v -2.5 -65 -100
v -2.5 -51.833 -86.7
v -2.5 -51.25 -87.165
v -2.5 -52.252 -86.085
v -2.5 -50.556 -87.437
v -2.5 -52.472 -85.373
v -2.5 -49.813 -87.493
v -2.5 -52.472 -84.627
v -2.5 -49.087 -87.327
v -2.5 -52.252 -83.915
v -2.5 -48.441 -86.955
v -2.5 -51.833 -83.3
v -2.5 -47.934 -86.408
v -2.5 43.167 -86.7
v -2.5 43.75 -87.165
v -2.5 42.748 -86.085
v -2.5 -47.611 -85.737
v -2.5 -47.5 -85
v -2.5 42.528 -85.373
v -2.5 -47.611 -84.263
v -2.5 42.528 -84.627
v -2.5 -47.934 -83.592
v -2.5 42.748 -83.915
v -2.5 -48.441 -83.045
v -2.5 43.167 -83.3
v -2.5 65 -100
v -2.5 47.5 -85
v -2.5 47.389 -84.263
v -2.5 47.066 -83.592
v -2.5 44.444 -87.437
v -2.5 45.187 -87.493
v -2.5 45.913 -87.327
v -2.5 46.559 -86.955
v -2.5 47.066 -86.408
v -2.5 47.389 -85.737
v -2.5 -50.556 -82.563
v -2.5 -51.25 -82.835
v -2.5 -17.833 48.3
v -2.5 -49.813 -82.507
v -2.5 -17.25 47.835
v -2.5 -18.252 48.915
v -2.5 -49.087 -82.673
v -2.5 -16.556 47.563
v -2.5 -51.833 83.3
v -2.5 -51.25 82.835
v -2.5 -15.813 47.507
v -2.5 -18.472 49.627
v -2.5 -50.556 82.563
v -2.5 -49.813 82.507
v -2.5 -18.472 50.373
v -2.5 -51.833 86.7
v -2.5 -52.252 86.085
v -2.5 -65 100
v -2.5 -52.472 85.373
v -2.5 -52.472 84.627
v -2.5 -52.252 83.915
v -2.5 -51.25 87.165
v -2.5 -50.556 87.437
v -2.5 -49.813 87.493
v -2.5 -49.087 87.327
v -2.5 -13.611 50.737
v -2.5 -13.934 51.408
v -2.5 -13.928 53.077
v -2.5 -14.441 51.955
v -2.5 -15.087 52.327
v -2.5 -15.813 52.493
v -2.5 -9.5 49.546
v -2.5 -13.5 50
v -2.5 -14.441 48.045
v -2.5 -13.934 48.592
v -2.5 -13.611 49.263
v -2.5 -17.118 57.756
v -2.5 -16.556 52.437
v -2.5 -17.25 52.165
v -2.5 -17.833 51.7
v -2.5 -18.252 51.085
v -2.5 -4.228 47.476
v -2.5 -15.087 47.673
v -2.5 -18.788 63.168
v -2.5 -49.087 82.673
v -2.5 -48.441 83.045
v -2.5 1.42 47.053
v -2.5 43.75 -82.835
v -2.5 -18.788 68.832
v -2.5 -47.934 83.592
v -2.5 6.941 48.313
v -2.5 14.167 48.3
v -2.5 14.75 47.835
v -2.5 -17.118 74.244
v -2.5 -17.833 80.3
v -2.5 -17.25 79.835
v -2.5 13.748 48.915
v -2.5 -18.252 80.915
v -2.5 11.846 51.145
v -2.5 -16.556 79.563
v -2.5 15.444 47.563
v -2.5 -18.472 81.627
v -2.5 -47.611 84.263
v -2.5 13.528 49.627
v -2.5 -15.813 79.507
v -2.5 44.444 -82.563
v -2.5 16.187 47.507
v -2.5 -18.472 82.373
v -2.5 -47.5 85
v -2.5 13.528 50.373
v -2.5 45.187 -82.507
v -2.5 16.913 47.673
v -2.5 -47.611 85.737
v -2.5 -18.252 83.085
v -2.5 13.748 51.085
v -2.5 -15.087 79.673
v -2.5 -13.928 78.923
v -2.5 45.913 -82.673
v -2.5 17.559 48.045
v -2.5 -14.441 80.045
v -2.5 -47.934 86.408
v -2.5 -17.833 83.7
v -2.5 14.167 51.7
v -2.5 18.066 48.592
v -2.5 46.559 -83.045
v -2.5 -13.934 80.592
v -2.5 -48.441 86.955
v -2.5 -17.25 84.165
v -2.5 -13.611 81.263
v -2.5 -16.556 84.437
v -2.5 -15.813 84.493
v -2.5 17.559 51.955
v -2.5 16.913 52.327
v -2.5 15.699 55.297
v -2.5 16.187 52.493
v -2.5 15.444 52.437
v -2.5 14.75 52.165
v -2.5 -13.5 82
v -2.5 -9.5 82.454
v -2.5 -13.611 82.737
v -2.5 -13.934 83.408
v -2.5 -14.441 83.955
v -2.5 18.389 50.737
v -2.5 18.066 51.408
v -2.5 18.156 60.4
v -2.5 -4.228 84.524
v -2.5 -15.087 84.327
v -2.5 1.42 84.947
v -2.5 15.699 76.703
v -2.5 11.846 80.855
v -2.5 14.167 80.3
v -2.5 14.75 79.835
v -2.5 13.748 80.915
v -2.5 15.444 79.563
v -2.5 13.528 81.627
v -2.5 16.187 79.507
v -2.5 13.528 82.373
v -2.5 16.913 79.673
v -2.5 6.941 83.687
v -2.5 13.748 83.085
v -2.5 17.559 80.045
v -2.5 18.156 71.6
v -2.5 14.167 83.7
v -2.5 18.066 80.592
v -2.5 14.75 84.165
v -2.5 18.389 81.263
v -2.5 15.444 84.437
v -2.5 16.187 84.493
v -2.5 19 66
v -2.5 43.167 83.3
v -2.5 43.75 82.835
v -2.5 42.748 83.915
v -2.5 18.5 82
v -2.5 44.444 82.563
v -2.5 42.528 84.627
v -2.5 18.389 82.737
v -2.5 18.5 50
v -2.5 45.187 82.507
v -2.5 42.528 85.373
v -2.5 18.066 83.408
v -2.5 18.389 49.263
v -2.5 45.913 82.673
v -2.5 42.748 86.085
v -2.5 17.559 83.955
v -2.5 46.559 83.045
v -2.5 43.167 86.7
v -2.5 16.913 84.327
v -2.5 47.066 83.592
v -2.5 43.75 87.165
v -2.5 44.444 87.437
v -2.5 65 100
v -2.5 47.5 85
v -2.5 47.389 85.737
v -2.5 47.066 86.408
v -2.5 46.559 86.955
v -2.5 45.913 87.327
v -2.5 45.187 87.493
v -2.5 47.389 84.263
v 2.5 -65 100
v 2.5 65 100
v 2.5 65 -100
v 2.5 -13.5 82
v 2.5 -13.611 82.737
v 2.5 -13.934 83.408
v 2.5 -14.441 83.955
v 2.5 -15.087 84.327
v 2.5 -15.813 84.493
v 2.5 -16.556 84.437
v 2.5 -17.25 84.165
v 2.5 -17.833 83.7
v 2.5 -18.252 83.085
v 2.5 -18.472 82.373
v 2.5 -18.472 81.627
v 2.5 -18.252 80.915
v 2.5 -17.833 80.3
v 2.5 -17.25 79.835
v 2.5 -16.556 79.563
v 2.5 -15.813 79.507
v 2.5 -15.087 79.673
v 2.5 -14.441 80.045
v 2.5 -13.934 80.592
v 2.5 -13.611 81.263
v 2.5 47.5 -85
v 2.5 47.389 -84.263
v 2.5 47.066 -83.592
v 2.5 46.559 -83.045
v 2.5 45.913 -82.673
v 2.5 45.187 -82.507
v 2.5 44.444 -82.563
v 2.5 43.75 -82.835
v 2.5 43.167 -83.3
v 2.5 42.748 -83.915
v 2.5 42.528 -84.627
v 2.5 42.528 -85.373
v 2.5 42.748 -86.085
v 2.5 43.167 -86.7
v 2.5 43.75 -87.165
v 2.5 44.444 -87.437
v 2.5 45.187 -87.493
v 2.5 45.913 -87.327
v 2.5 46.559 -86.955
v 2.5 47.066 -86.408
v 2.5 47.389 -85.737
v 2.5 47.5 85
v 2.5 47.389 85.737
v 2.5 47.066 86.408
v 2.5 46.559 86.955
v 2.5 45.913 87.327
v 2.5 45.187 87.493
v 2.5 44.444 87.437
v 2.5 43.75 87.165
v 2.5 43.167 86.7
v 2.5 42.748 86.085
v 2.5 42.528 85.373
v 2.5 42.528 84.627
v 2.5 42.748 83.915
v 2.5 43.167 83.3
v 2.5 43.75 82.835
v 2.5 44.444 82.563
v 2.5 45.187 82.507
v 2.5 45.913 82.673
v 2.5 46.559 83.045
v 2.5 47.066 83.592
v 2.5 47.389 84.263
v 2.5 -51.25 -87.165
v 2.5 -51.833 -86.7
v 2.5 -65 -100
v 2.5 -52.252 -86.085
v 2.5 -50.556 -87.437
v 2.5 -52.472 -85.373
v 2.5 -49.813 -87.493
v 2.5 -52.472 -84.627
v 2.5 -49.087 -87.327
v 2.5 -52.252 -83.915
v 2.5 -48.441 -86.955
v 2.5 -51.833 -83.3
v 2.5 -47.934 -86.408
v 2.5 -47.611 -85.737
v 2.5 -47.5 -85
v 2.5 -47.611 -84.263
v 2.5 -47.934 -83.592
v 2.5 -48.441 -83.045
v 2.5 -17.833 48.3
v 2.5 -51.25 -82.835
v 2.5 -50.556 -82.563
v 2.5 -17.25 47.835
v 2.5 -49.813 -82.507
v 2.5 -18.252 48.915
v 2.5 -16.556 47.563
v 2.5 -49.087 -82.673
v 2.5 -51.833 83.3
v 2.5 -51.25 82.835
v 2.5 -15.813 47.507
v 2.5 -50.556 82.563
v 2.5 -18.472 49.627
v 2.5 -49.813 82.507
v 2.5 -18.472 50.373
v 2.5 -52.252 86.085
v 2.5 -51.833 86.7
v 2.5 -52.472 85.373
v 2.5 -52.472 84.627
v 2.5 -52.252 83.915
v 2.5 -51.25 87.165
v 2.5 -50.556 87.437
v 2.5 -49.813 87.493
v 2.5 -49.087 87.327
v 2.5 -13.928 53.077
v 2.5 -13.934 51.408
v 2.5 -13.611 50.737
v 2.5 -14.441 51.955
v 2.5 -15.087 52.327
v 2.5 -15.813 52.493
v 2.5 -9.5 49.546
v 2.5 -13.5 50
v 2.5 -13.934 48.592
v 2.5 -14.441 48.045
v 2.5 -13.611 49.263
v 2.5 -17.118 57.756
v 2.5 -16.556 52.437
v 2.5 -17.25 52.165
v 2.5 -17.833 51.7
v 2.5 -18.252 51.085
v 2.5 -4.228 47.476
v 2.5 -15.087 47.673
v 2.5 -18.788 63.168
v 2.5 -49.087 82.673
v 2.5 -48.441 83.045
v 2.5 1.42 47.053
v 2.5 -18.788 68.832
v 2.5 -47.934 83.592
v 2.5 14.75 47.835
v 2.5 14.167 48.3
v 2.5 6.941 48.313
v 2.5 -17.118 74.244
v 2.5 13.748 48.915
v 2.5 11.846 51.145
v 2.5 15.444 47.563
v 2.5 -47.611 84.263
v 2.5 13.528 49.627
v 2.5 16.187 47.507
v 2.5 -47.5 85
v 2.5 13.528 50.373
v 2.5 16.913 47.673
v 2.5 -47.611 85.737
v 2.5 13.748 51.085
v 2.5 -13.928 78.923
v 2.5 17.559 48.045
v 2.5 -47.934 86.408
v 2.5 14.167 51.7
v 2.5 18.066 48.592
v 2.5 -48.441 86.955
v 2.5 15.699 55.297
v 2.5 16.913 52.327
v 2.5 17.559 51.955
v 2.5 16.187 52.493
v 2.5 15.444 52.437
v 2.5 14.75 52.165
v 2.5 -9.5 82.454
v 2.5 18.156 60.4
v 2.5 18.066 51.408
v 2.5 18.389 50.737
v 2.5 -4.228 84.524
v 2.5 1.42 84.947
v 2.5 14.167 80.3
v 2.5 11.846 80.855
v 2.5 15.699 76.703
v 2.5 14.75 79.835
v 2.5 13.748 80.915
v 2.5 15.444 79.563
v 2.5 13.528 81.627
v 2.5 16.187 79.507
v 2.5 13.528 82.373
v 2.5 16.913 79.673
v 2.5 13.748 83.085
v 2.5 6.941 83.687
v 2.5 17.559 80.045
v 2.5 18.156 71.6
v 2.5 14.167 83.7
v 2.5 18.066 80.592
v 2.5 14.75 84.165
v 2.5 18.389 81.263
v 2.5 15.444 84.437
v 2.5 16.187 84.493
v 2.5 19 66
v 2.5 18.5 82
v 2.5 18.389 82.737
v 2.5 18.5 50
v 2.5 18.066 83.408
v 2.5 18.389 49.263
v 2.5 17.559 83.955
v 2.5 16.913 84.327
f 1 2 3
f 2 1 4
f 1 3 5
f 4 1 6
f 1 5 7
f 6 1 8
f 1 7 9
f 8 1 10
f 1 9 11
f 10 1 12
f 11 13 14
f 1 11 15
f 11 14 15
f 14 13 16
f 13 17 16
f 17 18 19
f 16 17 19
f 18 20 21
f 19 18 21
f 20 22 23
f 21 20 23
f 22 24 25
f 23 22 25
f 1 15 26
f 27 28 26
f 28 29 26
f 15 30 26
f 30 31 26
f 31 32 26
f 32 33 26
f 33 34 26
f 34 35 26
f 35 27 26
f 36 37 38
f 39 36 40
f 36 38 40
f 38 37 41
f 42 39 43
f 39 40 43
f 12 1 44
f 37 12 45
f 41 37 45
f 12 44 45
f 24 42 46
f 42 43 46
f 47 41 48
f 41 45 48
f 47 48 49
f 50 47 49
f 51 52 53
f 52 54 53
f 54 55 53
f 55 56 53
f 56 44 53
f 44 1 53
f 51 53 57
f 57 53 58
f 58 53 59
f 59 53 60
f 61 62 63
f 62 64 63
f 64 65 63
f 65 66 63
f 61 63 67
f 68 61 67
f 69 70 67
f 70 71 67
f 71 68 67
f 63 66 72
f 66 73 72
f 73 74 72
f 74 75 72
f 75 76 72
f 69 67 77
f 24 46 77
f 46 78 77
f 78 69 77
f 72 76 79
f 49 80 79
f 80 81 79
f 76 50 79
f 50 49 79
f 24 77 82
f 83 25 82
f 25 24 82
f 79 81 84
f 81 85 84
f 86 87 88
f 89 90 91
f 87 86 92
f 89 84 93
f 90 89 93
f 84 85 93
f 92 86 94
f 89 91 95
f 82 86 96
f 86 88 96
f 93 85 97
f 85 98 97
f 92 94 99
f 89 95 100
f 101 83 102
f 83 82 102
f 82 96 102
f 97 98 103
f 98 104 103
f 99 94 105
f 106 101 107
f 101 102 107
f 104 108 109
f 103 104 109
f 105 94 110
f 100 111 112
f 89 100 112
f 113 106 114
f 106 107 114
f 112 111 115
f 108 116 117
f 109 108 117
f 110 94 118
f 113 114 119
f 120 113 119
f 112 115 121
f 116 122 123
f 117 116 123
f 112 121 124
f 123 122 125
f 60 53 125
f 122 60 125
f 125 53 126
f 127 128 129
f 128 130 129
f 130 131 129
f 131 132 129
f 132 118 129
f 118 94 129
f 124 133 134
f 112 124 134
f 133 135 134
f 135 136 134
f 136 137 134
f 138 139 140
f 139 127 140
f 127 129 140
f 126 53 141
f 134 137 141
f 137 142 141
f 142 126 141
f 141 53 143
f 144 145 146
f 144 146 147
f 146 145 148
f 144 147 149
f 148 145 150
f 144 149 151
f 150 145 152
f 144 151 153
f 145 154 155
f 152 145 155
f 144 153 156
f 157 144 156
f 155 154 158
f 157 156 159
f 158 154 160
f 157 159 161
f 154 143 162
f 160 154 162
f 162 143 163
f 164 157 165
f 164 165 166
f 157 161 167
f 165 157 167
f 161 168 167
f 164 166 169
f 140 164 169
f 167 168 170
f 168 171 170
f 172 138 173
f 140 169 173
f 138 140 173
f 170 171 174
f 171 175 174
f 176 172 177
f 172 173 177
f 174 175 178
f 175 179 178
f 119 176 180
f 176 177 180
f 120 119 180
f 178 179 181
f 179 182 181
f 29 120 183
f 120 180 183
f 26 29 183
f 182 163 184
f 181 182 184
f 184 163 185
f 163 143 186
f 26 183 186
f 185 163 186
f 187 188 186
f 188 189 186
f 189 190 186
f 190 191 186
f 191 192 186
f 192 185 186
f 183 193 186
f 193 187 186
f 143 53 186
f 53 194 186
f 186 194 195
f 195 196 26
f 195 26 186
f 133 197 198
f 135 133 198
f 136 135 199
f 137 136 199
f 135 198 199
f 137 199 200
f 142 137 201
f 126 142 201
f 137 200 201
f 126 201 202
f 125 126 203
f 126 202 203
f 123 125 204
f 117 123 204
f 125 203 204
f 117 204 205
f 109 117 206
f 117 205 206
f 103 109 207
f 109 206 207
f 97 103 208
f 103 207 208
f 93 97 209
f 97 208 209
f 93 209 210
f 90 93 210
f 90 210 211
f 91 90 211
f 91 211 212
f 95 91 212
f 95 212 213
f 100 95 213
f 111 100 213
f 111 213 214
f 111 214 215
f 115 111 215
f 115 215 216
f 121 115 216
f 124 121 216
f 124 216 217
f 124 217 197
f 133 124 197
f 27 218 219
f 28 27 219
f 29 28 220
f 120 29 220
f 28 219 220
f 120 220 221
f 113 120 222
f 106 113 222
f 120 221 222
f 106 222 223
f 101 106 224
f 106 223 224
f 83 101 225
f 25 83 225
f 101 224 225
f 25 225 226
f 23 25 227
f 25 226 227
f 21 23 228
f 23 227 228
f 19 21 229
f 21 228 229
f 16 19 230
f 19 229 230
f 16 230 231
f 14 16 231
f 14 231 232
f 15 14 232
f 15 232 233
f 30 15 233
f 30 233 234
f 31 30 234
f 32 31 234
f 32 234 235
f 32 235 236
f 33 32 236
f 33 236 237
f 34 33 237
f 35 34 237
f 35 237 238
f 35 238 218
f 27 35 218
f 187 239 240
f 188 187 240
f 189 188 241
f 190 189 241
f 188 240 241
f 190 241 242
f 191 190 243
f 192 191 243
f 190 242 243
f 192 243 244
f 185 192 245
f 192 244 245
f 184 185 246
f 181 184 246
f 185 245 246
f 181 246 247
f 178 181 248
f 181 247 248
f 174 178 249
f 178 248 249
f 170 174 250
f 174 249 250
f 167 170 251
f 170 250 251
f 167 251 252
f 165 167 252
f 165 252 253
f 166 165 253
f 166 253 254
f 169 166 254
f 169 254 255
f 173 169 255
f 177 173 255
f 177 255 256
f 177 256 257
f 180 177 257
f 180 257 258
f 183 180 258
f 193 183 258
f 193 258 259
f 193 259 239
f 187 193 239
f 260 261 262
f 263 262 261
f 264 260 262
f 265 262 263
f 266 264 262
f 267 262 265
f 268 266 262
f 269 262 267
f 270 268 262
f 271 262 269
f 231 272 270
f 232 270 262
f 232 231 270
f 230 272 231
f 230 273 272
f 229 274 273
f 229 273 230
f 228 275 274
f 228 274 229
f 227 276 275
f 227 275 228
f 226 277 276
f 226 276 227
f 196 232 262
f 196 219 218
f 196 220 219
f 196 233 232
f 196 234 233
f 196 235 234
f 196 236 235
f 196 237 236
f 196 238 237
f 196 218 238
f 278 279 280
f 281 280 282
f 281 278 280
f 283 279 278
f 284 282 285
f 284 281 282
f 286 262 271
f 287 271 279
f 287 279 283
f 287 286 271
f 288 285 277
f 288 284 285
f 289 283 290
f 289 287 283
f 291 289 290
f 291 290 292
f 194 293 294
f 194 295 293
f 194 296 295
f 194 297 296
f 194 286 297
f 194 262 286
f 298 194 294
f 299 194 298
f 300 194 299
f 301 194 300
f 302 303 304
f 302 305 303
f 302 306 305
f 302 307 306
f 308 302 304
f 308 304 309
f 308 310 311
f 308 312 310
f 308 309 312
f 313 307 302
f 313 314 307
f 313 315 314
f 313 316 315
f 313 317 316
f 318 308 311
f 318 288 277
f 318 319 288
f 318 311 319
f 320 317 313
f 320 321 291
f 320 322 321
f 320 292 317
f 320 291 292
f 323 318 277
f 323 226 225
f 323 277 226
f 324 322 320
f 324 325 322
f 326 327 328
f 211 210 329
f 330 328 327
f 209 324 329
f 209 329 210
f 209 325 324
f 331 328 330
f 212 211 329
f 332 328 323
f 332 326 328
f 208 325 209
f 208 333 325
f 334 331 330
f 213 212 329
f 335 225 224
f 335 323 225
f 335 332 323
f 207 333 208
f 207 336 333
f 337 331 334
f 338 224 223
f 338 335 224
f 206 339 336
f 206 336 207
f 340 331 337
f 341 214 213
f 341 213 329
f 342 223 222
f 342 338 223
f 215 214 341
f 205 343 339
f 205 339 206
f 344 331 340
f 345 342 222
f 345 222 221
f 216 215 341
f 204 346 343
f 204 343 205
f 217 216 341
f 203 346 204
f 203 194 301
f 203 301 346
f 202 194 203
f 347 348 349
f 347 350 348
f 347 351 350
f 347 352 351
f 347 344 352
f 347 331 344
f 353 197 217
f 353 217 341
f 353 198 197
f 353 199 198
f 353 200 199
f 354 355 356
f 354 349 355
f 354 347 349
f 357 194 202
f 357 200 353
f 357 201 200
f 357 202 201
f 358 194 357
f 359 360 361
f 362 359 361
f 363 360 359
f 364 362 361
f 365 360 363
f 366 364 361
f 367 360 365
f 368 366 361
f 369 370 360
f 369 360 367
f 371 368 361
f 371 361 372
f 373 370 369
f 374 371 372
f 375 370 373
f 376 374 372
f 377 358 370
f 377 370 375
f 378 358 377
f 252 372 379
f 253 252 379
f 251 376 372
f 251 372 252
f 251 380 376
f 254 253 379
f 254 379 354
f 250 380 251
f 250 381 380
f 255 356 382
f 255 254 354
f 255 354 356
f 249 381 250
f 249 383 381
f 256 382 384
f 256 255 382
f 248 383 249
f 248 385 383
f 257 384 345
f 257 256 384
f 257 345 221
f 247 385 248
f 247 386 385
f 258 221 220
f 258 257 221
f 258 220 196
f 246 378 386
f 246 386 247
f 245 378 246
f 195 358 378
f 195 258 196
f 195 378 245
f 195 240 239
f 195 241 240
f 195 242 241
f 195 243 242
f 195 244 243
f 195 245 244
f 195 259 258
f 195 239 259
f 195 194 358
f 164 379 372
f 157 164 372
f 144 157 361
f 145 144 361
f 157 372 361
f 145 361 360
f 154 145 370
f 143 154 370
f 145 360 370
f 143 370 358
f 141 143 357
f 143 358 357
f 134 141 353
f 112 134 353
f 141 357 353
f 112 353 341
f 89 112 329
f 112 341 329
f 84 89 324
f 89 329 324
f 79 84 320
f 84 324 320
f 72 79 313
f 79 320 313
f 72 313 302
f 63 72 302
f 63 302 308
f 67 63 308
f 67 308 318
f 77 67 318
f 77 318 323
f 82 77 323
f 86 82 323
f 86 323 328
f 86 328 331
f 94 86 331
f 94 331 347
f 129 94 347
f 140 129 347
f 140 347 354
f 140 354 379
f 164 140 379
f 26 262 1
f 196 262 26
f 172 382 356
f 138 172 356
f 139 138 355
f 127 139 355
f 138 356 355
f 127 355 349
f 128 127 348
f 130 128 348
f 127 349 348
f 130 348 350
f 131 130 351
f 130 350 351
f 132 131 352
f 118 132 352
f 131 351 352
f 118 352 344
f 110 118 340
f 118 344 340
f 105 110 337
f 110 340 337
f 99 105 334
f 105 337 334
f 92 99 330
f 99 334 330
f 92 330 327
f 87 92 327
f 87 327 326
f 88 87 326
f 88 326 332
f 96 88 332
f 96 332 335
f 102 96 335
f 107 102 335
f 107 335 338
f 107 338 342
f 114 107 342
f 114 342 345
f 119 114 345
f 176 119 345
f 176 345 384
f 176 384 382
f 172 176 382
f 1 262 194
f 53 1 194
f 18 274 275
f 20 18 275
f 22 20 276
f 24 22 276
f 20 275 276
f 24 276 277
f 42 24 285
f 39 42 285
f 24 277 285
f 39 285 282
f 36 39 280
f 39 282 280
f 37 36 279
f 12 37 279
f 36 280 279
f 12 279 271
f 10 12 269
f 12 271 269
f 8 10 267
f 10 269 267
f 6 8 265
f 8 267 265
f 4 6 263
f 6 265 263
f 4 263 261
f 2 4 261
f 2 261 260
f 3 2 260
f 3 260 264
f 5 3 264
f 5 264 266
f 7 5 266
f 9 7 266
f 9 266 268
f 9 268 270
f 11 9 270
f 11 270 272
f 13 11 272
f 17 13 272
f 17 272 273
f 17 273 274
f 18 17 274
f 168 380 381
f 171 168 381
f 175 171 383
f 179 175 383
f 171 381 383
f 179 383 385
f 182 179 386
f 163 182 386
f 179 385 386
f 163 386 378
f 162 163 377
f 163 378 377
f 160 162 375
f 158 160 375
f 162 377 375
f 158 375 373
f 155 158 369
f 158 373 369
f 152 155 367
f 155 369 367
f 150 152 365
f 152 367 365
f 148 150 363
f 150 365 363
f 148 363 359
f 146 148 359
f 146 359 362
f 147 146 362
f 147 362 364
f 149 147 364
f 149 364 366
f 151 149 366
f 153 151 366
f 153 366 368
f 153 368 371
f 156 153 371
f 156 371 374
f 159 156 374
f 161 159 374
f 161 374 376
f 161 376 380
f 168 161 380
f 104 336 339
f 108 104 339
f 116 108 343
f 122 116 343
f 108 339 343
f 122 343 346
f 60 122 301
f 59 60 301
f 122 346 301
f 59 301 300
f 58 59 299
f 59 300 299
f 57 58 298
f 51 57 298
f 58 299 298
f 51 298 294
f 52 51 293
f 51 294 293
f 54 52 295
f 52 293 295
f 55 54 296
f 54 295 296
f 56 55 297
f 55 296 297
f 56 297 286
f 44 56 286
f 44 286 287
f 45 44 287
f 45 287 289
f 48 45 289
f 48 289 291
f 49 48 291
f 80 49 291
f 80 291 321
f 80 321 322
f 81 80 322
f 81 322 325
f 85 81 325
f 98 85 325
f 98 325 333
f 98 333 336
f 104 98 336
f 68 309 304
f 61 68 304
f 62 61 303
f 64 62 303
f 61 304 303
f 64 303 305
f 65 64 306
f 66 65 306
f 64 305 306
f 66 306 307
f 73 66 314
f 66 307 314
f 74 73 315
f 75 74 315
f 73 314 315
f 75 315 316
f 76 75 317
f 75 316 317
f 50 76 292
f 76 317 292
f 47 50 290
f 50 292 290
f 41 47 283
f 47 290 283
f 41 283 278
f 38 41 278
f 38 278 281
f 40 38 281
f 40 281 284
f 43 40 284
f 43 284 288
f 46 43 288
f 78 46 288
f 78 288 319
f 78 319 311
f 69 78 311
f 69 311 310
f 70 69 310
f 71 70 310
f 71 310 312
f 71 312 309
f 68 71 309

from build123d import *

# Parameters (mm, degrees)
SKETCH_W        = 130
SKETCH_H        = 200
PAD_DEPTH       = 2.5
SKETCH001_R     = 2.5
POCKET_DEPTH    = 5.001
SKETCH002_R     = 19
SKETCH002_R_2   = 2.5
POCKET001_DEPTH = 5.001


with BuildPart() as part:
    # Sketch → Pad (new body, symmetric)
    with BuildSketch(Plane.YZ):
        Rectangle(SKETCH_W, SKETCH_H)
    extrude(amount=PAD_DEPTH, both=True)

    # Sketch001 (on Face6 of Pad) → Pocket (cut, through all)
    with BuildSketch(Plane.YZ.offset(2.5)):
        with Locations((-50, 85)):
            Circle(SKETCH001_R)
        with Locations((45, 85)):
            Circle(SKETCH001_R)
        with Locations((-50, -85)):
            Circle(SKETCH001_R)
        with Locations((45, -85)):
            Circle(SKETCH001_R)
    extrude(amount=-POCKET_DEPTH, mode=Mode.SUBTRACT)

    # Sketch002 (on Face5 of Pocket) → Pocket001 (cut, through all)
    with BuildSketch(Plane.YZ.offset(2.5)):
        with Locations((0, 66)):
            Circle(SKETCH002_R)
        with Locations((-16, 82)):
            Circle(SKETCH002_R_2)
        with Locations((16, 82)):
            Circle(SKETCH002_R_2)
        with Locations((16, 50)):
            Circle(SKETCH002_R_2)
        with Locations((-16, 50)):
            Circle(SKETCH002_R_2)
    extrude(amount=-POCKET001_DEPTH, mode=Mode.SUBTRACT)


solid = part.part
